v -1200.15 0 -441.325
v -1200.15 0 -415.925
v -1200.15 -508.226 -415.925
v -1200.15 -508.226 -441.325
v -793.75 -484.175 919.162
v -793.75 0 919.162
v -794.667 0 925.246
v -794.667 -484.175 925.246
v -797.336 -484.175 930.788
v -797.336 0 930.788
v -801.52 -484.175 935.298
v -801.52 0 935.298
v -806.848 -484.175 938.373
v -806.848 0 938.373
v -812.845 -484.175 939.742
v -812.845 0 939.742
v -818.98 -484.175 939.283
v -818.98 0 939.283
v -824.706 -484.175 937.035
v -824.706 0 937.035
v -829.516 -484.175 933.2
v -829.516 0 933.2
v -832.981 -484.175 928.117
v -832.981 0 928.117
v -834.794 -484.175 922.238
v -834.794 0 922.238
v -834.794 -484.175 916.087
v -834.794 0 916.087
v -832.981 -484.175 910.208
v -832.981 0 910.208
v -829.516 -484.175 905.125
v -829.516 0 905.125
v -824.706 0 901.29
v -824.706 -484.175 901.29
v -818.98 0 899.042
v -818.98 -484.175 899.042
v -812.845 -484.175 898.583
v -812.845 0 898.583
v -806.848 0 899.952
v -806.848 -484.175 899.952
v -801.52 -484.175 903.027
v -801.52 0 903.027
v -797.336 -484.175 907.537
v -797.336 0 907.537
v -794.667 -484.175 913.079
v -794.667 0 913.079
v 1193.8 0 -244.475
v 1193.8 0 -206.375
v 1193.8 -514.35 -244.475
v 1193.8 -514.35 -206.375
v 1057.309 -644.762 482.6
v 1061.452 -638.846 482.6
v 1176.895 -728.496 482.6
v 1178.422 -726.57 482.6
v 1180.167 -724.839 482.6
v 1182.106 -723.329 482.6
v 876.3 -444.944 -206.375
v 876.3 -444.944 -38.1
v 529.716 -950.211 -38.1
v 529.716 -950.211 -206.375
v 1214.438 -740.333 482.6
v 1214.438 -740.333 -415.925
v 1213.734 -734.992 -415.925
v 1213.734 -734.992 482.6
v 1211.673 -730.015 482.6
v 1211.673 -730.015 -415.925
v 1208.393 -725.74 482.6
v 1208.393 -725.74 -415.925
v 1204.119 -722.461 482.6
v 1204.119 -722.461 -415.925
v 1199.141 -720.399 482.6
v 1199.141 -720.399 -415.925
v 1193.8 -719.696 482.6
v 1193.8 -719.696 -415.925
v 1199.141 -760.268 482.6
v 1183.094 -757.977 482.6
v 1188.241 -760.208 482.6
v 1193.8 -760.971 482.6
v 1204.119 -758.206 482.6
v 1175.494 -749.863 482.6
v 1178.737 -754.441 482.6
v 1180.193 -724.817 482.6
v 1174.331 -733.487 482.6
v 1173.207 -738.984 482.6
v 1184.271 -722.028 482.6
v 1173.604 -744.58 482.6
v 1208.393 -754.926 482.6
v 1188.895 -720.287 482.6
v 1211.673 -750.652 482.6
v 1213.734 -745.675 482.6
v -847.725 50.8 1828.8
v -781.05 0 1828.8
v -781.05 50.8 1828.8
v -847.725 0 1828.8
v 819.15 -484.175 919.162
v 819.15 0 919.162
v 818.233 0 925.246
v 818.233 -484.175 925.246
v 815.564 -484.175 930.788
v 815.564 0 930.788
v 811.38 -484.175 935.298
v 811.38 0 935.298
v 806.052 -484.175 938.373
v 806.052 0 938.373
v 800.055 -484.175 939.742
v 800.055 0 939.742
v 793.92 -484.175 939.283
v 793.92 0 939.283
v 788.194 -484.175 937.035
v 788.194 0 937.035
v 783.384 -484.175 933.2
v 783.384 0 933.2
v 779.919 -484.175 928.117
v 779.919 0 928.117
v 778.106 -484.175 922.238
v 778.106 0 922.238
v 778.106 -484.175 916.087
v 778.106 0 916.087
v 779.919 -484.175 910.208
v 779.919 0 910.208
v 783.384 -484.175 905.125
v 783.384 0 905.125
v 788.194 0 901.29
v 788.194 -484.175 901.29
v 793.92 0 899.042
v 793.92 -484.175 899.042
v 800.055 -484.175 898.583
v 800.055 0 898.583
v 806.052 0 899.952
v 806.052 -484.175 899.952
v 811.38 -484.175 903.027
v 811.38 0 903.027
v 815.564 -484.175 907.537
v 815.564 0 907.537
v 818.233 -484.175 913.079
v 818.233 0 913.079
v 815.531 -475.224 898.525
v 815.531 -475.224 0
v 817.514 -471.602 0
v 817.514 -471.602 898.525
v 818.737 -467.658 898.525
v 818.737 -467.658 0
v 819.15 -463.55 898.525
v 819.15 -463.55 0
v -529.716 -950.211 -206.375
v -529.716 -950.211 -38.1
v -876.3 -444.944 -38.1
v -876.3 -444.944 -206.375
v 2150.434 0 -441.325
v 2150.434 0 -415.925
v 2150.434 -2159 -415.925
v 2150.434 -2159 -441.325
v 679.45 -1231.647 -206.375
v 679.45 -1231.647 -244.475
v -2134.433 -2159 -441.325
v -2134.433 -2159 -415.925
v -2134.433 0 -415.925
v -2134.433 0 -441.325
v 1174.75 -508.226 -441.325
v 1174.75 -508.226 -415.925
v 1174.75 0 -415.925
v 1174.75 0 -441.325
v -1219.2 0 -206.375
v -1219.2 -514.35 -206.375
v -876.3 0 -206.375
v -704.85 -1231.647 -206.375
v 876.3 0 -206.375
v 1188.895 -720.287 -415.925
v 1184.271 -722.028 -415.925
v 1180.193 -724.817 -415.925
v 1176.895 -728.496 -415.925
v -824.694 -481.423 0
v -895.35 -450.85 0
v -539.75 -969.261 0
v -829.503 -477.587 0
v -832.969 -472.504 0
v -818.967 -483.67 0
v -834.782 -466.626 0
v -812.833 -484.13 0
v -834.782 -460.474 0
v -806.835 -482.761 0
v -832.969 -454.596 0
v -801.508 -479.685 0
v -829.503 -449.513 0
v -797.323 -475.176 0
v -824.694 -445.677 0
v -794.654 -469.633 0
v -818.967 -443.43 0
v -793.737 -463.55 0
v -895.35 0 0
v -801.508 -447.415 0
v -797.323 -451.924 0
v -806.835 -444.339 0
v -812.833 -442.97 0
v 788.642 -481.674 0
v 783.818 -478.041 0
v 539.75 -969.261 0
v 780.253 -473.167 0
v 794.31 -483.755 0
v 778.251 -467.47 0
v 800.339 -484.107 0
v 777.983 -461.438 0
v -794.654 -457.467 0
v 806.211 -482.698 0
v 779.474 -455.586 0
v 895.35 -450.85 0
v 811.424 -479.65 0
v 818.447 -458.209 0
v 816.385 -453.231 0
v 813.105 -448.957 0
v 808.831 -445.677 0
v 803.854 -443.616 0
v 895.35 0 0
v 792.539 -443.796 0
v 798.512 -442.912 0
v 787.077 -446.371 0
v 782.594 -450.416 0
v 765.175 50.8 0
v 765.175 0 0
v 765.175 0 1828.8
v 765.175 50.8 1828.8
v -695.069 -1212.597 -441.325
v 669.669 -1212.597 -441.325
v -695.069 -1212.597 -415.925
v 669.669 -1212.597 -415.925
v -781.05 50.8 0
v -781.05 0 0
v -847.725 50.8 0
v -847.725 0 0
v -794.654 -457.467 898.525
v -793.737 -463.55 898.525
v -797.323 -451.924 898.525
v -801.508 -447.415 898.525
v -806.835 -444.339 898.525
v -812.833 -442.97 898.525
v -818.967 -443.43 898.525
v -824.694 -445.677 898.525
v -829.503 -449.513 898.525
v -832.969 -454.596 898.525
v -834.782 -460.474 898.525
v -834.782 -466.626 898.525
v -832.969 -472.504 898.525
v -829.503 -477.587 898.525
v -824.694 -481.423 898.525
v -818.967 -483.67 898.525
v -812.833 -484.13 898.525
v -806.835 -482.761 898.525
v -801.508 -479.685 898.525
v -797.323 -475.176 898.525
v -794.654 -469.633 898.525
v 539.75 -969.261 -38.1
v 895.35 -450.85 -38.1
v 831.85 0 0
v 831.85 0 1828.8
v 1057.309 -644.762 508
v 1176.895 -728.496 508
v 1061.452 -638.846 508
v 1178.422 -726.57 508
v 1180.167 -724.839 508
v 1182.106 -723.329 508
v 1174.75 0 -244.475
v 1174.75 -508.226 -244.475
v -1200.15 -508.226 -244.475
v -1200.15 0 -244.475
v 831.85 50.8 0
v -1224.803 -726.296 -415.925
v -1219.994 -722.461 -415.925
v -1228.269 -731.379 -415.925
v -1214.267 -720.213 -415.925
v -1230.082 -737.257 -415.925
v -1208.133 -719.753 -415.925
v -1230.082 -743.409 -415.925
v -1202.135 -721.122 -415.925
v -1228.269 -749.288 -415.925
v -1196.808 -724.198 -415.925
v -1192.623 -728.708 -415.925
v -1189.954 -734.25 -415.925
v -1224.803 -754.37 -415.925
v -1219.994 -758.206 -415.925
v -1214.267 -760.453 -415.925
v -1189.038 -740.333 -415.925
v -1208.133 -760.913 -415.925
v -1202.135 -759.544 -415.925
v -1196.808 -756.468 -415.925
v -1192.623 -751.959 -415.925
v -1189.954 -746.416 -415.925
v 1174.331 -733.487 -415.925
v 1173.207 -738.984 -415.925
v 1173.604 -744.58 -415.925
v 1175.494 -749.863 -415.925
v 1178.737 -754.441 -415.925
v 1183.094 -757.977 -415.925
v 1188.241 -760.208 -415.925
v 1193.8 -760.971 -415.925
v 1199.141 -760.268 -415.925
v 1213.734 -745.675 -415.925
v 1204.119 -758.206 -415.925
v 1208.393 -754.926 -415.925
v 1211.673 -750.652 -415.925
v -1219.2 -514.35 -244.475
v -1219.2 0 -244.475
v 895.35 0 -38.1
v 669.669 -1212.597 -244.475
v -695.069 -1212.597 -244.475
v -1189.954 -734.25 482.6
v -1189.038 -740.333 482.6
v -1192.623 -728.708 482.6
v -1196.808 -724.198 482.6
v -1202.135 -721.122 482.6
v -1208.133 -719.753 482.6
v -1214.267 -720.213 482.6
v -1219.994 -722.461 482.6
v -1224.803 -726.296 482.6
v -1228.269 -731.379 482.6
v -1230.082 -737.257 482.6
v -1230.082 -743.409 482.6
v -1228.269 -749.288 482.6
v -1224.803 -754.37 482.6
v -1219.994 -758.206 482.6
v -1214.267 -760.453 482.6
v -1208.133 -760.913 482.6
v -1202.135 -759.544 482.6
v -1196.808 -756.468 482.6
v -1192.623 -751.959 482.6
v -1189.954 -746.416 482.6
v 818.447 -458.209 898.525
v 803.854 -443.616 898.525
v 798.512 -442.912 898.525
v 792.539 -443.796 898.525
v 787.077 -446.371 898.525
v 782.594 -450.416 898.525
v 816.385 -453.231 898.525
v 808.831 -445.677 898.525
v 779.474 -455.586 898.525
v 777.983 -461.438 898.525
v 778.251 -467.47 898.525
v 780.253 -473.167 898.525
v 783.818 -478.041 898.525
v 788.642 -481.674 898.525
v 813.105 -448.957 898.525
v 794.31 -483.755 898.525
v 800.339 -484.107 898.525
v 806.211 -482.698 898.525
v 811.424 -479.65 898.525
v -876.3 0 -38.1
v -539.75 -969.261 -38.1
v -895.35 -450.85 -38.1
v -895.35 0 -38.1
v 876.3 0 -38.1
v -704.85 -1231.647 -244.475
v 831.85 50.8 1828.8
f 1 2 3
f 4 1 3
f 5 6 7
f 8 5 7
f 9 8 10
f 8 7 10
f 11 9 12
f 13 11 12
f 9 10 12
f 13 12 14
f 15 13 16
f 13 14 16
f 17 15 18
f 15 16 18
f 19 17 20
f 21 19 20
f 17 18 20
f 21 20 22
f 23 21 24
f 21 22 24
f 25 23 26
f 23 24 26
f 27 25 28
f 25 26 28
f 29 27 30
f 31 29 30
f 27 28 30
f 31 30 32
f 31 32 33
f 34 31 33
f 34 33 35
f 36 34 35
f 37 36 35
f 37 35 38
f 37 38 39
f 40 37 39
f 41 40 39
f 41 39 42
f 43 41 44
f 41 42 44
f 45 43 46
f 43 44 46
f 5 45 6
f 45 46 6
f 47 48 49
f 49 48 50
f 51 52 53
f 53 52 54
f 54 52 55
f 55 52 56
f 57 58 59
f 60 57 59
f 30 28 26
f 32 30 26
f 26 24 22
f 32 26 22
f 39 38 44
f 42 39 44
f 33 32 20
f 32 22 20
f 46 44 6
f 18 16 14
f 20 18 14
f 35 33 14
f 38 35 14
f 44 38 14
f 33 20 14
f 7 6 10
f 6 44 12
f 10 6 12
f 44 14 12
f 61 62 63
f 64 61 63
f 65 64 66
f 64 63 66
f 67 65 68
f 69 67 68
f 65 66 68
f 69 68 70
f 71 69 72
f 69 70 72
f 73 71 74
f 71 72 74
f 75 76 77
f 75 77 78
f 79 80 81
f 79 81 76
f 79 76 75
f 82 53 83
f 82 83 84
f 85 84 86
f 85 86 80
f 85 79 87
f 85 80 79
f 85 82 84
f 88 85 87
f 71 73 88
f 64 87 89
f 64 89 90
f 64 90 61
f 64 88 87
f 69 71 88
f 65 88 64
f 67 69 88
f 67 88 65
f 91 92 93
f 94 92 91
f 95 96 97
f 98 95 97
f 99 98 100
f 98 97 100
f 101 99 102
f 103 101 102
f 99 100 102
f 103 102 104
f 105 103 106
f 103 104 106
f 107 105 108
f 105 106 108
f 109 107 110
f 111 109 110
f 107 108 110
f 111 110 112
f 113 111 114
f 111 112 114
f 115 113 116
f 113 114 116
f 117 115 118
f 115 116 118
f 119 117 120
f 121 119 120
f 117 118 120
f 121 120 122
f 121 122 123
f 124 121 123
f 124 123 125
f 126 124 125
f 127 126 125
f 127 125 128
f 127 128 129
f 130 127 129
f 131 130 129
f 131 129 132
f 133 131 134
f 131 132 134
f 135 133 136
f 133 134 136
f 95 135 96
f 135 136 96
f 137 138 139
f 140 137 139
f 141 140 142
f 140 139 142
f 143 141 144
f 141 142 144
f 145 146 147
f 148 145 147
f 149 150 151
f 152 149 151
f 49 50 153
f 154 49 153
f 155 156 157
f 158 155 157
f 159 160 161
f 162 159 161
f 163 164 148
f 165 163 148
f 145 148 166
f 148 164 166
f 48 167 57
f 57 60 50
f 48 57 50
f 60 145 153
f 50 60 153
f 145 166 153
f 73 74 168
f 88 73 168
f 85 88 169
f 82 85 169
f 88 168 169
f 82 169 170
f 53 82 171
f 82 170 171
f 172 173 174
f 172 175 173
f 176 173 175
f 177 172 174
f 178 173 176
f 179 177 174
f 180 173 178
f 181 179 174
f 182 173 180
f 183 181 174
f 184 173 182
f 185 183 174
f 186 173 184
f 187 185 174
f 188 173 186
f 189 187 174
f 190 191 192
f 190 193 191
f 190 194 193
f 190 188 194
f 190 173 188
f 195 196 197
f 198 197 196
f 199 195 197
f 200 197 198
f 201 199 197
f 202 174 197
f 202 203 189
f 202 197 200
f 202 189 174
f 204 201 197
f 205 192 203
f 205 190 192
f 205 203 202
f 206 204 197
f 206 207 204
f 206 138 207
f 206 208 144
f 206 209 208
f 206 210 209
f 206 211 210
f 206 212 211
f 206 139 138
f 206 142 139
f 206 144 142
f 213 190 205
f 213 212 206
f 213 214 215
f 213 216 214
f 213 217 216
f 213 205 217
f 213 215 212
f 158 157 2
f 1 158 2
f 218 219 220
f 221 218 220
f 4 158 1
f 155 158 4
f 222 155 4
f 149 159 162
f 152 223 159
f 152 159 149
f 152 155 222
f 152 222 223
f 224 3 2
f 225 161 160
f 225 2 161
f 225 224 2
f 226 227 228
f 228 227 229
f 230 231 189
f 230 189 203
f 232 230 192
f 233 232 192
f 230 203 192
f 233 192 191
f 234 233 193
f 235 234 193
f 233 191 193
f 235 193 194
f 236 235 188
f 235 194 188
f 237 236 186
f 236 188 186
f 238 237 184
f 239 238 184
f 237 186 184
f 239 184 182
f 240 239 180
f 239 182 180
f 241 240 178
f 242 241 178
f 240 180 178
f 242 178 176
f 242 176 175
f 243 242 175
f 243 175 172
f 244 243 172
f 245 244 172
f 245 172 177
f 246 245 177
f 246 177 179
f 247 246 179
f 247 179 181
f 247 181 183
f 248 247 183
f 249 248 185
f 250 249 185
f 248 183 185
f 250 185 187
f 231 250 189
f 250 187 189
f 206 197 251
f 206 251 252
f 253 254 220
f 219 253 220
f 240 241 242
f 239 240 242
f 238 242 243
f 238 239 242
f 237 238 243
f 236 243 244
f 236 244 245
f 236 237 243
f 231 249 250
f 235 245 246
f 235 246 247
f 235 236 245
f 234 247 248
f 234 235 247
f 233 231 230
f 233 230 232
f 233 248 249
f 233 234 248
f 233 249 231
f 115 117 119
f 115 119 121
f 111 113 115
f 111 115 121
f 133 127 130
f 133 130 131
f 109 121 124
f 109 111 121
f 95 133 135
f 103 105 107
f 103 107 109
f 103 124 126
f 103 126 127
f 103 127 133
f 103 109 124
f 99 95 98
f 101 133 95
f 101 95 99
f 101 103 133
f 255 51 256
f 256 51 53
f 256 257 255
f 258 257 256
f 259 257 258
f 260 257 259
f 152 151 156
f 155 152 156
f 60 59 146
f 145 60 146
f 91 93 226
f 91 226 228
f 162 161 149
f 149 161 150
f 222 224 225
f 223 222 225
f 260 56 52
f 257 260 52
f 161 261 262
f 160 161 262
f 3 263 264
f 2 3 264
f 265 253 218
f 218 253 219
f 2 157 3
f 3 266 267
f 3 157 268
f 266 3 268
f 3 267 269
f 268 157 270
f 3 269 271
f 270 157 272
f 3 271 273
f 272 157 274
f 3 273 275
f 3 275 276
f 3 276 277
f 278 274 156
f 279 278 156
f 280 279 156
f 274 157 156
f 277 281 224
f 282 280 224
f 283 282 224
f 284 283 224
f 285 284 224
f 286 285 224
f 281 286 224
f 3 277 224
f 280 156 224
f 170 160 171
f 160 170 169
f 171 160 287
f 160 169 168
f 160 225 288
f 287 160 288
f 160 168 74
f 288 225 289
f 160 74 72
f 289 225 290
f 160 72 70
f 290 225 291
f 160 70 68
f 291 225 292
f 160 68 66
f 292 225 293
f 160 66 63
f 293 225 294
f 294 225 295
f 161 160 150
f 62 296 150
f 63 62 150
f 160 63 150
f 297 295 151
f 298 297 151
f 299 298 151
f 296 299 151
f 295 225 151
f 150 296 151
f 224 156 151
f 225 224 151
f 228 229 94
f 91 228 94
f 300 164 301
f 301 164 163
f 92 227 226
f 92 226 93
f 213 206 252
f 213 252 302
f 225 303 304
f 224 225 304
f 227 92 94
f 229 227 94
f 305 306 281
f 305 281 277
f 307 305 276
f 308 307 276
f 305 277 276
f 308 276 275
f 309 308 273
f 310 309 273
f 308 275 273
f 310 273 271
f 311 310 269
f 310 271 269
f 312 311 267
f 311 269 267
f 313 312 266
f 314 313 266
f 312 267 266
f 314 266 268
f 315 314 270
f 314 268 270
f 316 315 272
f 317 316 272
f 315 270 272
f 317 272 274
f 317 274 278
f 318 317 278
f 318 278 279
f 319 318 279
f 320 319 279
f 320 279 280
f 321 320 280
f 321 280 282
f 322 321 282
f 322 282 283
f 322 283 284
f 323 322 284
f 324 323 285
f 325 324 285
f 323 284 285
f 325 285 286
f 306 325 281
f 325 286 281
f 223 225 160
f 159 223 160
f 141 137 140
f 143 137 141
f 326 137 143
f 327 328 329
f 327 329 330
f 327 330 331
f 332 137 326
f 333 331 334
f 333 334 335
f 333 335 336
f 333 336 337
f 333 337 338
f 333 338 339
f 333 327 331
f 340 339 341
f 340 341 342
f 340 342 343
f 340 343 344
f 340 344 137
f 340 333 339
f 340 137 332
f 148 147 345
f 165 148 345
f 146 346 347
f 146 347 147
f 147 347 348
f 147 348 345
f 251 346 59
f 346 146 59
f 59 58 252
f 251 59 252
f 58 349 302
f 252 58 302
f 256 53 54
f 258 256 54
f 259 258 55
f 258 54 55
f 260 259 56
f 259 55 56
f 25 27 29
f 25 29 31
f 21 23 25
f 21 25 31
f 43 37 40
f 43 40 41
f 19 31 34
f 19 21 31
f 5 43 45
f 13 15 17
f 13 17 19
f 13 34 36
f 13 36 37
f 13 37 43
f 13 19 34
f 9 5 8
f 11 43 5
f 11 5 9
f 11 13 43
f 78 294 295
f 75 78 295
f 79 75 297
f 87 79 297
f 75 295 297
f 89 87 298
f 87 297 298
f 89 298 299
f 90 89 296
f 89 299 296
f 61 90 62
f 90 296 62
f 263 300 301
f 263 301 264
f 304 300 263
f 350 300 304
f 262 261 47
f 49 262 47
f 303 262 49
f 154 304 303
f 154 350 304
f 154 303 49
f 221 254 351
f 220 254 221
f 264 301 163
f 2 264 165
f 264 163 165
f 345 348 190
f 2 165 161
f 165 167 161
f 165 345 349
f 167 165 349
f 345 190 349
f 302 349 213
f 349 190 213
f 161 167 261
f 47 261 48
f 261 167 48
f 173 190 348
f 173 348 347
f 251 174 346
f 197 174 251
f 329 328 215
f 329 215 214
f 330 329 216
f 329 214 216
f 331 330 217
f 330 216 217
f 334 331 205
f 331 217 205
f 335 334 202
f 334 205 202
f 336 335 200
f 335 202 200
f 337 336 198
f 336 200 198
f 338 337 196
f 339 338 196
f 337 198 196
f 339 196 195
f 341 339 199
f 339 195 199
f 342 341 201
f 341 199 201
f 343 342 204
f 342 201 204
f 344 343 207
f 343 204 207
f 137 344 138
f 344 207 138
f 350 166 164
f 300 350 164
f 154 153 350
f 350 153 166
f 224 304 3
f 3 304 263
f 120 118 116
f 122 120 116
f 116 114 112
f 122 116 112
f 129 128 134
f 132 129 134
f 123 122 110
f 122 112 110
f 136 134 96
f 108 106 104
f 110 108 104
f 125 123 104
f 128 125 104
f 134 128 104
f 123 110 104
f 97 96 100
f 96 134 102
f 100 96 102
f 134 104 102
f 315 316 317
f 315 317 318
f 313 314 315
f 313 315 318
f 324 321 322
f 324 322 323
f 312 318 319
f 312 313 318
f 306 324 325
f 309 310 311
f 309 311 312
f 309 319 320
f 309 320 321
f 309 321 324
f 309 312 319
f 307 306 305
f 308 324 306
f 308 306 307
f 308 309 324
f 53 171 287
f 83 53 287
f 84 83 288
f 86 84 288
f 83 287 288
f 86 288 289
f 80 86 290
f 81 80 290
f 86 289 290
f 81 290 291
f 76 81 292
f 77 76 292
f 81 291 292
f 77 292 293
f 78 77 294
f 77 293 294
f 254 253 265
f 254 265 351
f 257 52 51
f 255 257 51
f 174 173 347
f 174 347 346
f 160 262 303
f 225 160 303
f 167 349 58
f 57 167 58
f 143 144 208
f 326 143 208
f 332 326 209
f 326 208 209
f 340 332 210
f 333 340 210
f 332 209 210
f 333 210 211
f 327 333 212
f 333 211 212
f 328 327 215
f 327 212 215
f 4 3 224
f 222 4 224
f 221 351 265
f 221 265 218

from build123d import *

# Parameters (mm, degrees)
F1_DEPTH  = 38.1
F3_DEPTH  = 168.275
F5_DEPTH  = 38.1
F7_DEPTH  = 171.45
F9_DEPTH  = 25.4
F10_W     = 66.675
F10_H     = 1828.8
F11_DEPTH = 50.8
F12_R     = 20.6375
F13_DEPTH = 898.525
F18_R     = 20.6375
F19_DEPTH = 898.525
F14_R     = 20.6375
F20_DEPTH = 484.1748
F21_R     = 20.6375
F23_DEPTH = 484.1748
F25_DEPTH = 25.4


# Not quite as in the source:
# - the program builds the solid bodies; features that only make, move or delete a surface that nothing else refers to are left out


with BuildPart() as f1:
    # F0 (on Top) → F1 (new body)
    with BuildSketch(Plane.XY):
        Polygon((0, -969.2605154219), (0, 0), (-895.35, 0), (-895.35, -450.85), (-539.75, -969.2605154219), align=None)
        Polygon((895.35, 0), (0, 0), (0, -969.2605154219), (539.75, -969.2605154219), (895.35, -450.85), align=None)
    extrude(amount=-F1_DEPTH)

    # F2 (on face) → F3 (join)
    with BuildSketch(Plane(origin=(0, 0, -38.1), x_dir=(1, 0, 0), z_dir=(0, 0, -1))):
        Polygon((-876.3, 0), (876.3, 0), (876.3, 444.9443133262), (529.7162480886, 950.2105154219), (-529.7162480886, 950.2105154219), (-876.3, 444.9443133262), align=None)
    extrude(amount=F3_DEPTH)

    # F4 (on face) → F5 (join)
    with BuildSketch(Plane(origin=(0, 0, -206.375), x_dir=(1, 0, 0), z_dir=(0, 0, -1))):
        Polygon((-1219.2, 0), (-876.3, 0), (-876.3, 444.9443133262), (-529.7162480886, 950.2105154219), (529.7162480886, 950.2105154219), (876.3, 444.9443133262), (876.3, 0), (1193.8, 0), (1193.8, 514.35), (679.45, 1231.6470793193), (-704.85, 1231.6470793193), (-1219.2, 514.35), align=None)
        Polygon((-876.3, 0), (0, 0), (876.3, 0), (876.3, 444.9443133262), (529.7162480886, 950.2105154219), (-529.7162480886, 950.2105154219), (-876.3, 444.9443133262), align=None)
    extrude(amount=F5_DEPTH)

    # F6 (on face) → F7 (join)
    with BuildSketch(Plane(origin=(0, 0, -244.475), x_dir=(1, 0, 0), z_dir=(0, 0, -1))):
        Polygon((1174.75, 0), (1174.75, 508.2258177526), (669.6686761911, 1212.5970793193), (-695.0686761911, 1212.5970793193), (-1200.15, 508.2258177526), (-1200.15, 0), align=None)
    extrude(amount=F7_DEPTH)

    # F12 (on face) → F13 (join)
    with BuildSketch(Plane.XY):
        with BuildLine():
            Line((798.5125, -463.55), (798.5125, -442.9125))
            ThreePointArc((798.5125, -442.9125), (780.2529386512, -473.1674230228), (815.5310270214, -475.2237373737))
            Line((815.5310270214, -475.2237373737), (798.5125, -463.55))
        make_face()
        with BuildLine():
            ThreePointArc((815.5310270214, -475.2237373737), (818.2245046882, -469.6609146143), (819.15, -463.55))
            ThreePointArc((819.15, -463.55), (813.1054161967, -448.9570838033), (798.5125, -442.9125))
            Line((798.5125, -442.9125), (798.5125, -463.55))
            Line((798.5125, -463.55), (815.5310270214, -475.2237373737))
        make_face()
        with Locations((-814.3748, -463.55)):
            Circle(F12_R)
    extrude(amount=F13_DEPTH)


with BuildPart() as f9:
    # F8 (on face) → F9 (new body)
    with BuildSketch(Plane(origin=(0, 0, -415.925), x_dir=(1, 0, 0), z_dir=(0, 0, -1))):
        Polygon((-2134.432844689, 0), (-1200.15, 0), (-1200.15, 508.2258177526), (-695.0686761911, 1212.5970793193), (0, 1212.5970793193), (0, 2159), (-2134.432844689, 2159), align=None)
        Polygon((0, 2159), (0, 1212.5970793193), (669.6686761911, 1212.5970793193), (1174.75, 508.2258177526), (1174.75, 0), (2150.4339796972, 0), (2150.4339796972, 2159), align=None)
    extrude(amount=F9_DEPTH)

    # F18 (on face) → F19 (join)
    with BuildSketch(Plane.XY.offset(-415.925)):
        with BuildLine():
            ThreePointArc((1214.4375, -740.3332872601), (1208.3929161967, -725.7403710633), (1193.8, -719.6957872601))
            Line((1193.8, -719.6957872601), (1193.8, -740.3332872601))
            Line((1193.8, -740.3332872601), (1210.705250314, -752.1704709653))
            ThreePointArc((1210.705250314, -752.1704709653), (1213.4823335711, -746.5391031973), (1214.4375, -740.3332872601))
        make_face()
        with BuildLine():
            ThreePointArc((1193.8, -719.6957872601), (1184.2706629944, -722.0276011904), (1176.894749686, -728.4961035549))
            Line((1176.894749686, -728.4961035549), (1193.8, -740.3332872601))
            Line((1193.8, -740.3332872601), (1193.8, -719.6957872601))
        make_face()
        with BuildLine():
            Line((1193.8, -740.3332872601), (1176.894749686, -728.4961035549))
            ThreePointArc((1176.894749686, -728.4961035549), (1175.4943139303, -749.8626242657), (1193.8, -760.9707872601))
            Line((1193.8, -760.9707872601), (1193.8, -740.3332872601))
        make_face()
        with BuildLine():
            Line((1210.705250314, -752.1704709653), (1193.8, -740.3332872601))
            Line((1193.8, -740.3332872601), (1193.8, -760.9707872601))
            ThreePointArc((1193.8, -760.9707872601), (1203.3293370056, -758.6389733298), (1210.705250314, -752.1704709653))
        make_face()
        with Locations((-1209.675, -740.3332872601)):
            Circle(F18_R)
    extrude(amount=F19_DEPTH)


with BuildPart() as f11:
    # F10 (on face) → F11 (new body)
    with BuildSketch(Plane(origin=(0, 0, 0), x_dir=(-1, 0, 0), z_dir=(0, 1, 0))):
        with Locations((814.3875, 914.4)):
            Rectangle(F10_W, F10_H)
    extrude(amount=F11_DEPTH)


with BuildPart() as f11b:
    # F10 (on face) → F11, piece 2 (new body)
    with BuildSketch(Plane(origin=(0, 0, 0), x_dir=(-1, 0, 0), z_dir=(0, 1, 0))):
        with Locations((-798.5125, 914.4)):
            Rectangle(F10_W, F10_H)
    extrude(amount=F11_DEPTH)


with BuildPart() as f20:
    # F14 (on face) → F20 (new body)
    with BuildSketch(Plane.XZ):
        with Locations((798.5125, 919.1625)):
            Circle(F14_R)
    extrude(amount=F20_DEPTH)


with BuildPart() as f23:
    # F21 (on face) → F23 (new body)
    with BuildSketch(Plane.XZ):
        with Locations((-814.3875, 919.1625)):
            Circle(F21_R)
    extrude(amount=F23_DEPTH)


with BuildPart() as f25:
    # F24 (on face) → F25 (new body)
    with BuildSketch(Plane.XY.offset(482.6)):
        with BuildLine():
            Line((1061.451881372, -638.8455143858), (1057.3094238, -644.7615569102))
            Line((1057.3094238, -644.7615569102), (1176.894749686, -728.4961035549))
            ThreePointArc((1176.894749686, -728.4961035549), (1179.2689059117, -725.6788097584), (1182.1061723691, -723.3285584593))
            Line((1182.1061723691, -723.3285584593), (1061.451881372, -638.8455143858))
        make_face()
    extrude(amount=F25_DEPTH)


solid = Compound([f1.part, f9.part, f11.part, f11b.part, f20.part, f23.part, f25.part])
